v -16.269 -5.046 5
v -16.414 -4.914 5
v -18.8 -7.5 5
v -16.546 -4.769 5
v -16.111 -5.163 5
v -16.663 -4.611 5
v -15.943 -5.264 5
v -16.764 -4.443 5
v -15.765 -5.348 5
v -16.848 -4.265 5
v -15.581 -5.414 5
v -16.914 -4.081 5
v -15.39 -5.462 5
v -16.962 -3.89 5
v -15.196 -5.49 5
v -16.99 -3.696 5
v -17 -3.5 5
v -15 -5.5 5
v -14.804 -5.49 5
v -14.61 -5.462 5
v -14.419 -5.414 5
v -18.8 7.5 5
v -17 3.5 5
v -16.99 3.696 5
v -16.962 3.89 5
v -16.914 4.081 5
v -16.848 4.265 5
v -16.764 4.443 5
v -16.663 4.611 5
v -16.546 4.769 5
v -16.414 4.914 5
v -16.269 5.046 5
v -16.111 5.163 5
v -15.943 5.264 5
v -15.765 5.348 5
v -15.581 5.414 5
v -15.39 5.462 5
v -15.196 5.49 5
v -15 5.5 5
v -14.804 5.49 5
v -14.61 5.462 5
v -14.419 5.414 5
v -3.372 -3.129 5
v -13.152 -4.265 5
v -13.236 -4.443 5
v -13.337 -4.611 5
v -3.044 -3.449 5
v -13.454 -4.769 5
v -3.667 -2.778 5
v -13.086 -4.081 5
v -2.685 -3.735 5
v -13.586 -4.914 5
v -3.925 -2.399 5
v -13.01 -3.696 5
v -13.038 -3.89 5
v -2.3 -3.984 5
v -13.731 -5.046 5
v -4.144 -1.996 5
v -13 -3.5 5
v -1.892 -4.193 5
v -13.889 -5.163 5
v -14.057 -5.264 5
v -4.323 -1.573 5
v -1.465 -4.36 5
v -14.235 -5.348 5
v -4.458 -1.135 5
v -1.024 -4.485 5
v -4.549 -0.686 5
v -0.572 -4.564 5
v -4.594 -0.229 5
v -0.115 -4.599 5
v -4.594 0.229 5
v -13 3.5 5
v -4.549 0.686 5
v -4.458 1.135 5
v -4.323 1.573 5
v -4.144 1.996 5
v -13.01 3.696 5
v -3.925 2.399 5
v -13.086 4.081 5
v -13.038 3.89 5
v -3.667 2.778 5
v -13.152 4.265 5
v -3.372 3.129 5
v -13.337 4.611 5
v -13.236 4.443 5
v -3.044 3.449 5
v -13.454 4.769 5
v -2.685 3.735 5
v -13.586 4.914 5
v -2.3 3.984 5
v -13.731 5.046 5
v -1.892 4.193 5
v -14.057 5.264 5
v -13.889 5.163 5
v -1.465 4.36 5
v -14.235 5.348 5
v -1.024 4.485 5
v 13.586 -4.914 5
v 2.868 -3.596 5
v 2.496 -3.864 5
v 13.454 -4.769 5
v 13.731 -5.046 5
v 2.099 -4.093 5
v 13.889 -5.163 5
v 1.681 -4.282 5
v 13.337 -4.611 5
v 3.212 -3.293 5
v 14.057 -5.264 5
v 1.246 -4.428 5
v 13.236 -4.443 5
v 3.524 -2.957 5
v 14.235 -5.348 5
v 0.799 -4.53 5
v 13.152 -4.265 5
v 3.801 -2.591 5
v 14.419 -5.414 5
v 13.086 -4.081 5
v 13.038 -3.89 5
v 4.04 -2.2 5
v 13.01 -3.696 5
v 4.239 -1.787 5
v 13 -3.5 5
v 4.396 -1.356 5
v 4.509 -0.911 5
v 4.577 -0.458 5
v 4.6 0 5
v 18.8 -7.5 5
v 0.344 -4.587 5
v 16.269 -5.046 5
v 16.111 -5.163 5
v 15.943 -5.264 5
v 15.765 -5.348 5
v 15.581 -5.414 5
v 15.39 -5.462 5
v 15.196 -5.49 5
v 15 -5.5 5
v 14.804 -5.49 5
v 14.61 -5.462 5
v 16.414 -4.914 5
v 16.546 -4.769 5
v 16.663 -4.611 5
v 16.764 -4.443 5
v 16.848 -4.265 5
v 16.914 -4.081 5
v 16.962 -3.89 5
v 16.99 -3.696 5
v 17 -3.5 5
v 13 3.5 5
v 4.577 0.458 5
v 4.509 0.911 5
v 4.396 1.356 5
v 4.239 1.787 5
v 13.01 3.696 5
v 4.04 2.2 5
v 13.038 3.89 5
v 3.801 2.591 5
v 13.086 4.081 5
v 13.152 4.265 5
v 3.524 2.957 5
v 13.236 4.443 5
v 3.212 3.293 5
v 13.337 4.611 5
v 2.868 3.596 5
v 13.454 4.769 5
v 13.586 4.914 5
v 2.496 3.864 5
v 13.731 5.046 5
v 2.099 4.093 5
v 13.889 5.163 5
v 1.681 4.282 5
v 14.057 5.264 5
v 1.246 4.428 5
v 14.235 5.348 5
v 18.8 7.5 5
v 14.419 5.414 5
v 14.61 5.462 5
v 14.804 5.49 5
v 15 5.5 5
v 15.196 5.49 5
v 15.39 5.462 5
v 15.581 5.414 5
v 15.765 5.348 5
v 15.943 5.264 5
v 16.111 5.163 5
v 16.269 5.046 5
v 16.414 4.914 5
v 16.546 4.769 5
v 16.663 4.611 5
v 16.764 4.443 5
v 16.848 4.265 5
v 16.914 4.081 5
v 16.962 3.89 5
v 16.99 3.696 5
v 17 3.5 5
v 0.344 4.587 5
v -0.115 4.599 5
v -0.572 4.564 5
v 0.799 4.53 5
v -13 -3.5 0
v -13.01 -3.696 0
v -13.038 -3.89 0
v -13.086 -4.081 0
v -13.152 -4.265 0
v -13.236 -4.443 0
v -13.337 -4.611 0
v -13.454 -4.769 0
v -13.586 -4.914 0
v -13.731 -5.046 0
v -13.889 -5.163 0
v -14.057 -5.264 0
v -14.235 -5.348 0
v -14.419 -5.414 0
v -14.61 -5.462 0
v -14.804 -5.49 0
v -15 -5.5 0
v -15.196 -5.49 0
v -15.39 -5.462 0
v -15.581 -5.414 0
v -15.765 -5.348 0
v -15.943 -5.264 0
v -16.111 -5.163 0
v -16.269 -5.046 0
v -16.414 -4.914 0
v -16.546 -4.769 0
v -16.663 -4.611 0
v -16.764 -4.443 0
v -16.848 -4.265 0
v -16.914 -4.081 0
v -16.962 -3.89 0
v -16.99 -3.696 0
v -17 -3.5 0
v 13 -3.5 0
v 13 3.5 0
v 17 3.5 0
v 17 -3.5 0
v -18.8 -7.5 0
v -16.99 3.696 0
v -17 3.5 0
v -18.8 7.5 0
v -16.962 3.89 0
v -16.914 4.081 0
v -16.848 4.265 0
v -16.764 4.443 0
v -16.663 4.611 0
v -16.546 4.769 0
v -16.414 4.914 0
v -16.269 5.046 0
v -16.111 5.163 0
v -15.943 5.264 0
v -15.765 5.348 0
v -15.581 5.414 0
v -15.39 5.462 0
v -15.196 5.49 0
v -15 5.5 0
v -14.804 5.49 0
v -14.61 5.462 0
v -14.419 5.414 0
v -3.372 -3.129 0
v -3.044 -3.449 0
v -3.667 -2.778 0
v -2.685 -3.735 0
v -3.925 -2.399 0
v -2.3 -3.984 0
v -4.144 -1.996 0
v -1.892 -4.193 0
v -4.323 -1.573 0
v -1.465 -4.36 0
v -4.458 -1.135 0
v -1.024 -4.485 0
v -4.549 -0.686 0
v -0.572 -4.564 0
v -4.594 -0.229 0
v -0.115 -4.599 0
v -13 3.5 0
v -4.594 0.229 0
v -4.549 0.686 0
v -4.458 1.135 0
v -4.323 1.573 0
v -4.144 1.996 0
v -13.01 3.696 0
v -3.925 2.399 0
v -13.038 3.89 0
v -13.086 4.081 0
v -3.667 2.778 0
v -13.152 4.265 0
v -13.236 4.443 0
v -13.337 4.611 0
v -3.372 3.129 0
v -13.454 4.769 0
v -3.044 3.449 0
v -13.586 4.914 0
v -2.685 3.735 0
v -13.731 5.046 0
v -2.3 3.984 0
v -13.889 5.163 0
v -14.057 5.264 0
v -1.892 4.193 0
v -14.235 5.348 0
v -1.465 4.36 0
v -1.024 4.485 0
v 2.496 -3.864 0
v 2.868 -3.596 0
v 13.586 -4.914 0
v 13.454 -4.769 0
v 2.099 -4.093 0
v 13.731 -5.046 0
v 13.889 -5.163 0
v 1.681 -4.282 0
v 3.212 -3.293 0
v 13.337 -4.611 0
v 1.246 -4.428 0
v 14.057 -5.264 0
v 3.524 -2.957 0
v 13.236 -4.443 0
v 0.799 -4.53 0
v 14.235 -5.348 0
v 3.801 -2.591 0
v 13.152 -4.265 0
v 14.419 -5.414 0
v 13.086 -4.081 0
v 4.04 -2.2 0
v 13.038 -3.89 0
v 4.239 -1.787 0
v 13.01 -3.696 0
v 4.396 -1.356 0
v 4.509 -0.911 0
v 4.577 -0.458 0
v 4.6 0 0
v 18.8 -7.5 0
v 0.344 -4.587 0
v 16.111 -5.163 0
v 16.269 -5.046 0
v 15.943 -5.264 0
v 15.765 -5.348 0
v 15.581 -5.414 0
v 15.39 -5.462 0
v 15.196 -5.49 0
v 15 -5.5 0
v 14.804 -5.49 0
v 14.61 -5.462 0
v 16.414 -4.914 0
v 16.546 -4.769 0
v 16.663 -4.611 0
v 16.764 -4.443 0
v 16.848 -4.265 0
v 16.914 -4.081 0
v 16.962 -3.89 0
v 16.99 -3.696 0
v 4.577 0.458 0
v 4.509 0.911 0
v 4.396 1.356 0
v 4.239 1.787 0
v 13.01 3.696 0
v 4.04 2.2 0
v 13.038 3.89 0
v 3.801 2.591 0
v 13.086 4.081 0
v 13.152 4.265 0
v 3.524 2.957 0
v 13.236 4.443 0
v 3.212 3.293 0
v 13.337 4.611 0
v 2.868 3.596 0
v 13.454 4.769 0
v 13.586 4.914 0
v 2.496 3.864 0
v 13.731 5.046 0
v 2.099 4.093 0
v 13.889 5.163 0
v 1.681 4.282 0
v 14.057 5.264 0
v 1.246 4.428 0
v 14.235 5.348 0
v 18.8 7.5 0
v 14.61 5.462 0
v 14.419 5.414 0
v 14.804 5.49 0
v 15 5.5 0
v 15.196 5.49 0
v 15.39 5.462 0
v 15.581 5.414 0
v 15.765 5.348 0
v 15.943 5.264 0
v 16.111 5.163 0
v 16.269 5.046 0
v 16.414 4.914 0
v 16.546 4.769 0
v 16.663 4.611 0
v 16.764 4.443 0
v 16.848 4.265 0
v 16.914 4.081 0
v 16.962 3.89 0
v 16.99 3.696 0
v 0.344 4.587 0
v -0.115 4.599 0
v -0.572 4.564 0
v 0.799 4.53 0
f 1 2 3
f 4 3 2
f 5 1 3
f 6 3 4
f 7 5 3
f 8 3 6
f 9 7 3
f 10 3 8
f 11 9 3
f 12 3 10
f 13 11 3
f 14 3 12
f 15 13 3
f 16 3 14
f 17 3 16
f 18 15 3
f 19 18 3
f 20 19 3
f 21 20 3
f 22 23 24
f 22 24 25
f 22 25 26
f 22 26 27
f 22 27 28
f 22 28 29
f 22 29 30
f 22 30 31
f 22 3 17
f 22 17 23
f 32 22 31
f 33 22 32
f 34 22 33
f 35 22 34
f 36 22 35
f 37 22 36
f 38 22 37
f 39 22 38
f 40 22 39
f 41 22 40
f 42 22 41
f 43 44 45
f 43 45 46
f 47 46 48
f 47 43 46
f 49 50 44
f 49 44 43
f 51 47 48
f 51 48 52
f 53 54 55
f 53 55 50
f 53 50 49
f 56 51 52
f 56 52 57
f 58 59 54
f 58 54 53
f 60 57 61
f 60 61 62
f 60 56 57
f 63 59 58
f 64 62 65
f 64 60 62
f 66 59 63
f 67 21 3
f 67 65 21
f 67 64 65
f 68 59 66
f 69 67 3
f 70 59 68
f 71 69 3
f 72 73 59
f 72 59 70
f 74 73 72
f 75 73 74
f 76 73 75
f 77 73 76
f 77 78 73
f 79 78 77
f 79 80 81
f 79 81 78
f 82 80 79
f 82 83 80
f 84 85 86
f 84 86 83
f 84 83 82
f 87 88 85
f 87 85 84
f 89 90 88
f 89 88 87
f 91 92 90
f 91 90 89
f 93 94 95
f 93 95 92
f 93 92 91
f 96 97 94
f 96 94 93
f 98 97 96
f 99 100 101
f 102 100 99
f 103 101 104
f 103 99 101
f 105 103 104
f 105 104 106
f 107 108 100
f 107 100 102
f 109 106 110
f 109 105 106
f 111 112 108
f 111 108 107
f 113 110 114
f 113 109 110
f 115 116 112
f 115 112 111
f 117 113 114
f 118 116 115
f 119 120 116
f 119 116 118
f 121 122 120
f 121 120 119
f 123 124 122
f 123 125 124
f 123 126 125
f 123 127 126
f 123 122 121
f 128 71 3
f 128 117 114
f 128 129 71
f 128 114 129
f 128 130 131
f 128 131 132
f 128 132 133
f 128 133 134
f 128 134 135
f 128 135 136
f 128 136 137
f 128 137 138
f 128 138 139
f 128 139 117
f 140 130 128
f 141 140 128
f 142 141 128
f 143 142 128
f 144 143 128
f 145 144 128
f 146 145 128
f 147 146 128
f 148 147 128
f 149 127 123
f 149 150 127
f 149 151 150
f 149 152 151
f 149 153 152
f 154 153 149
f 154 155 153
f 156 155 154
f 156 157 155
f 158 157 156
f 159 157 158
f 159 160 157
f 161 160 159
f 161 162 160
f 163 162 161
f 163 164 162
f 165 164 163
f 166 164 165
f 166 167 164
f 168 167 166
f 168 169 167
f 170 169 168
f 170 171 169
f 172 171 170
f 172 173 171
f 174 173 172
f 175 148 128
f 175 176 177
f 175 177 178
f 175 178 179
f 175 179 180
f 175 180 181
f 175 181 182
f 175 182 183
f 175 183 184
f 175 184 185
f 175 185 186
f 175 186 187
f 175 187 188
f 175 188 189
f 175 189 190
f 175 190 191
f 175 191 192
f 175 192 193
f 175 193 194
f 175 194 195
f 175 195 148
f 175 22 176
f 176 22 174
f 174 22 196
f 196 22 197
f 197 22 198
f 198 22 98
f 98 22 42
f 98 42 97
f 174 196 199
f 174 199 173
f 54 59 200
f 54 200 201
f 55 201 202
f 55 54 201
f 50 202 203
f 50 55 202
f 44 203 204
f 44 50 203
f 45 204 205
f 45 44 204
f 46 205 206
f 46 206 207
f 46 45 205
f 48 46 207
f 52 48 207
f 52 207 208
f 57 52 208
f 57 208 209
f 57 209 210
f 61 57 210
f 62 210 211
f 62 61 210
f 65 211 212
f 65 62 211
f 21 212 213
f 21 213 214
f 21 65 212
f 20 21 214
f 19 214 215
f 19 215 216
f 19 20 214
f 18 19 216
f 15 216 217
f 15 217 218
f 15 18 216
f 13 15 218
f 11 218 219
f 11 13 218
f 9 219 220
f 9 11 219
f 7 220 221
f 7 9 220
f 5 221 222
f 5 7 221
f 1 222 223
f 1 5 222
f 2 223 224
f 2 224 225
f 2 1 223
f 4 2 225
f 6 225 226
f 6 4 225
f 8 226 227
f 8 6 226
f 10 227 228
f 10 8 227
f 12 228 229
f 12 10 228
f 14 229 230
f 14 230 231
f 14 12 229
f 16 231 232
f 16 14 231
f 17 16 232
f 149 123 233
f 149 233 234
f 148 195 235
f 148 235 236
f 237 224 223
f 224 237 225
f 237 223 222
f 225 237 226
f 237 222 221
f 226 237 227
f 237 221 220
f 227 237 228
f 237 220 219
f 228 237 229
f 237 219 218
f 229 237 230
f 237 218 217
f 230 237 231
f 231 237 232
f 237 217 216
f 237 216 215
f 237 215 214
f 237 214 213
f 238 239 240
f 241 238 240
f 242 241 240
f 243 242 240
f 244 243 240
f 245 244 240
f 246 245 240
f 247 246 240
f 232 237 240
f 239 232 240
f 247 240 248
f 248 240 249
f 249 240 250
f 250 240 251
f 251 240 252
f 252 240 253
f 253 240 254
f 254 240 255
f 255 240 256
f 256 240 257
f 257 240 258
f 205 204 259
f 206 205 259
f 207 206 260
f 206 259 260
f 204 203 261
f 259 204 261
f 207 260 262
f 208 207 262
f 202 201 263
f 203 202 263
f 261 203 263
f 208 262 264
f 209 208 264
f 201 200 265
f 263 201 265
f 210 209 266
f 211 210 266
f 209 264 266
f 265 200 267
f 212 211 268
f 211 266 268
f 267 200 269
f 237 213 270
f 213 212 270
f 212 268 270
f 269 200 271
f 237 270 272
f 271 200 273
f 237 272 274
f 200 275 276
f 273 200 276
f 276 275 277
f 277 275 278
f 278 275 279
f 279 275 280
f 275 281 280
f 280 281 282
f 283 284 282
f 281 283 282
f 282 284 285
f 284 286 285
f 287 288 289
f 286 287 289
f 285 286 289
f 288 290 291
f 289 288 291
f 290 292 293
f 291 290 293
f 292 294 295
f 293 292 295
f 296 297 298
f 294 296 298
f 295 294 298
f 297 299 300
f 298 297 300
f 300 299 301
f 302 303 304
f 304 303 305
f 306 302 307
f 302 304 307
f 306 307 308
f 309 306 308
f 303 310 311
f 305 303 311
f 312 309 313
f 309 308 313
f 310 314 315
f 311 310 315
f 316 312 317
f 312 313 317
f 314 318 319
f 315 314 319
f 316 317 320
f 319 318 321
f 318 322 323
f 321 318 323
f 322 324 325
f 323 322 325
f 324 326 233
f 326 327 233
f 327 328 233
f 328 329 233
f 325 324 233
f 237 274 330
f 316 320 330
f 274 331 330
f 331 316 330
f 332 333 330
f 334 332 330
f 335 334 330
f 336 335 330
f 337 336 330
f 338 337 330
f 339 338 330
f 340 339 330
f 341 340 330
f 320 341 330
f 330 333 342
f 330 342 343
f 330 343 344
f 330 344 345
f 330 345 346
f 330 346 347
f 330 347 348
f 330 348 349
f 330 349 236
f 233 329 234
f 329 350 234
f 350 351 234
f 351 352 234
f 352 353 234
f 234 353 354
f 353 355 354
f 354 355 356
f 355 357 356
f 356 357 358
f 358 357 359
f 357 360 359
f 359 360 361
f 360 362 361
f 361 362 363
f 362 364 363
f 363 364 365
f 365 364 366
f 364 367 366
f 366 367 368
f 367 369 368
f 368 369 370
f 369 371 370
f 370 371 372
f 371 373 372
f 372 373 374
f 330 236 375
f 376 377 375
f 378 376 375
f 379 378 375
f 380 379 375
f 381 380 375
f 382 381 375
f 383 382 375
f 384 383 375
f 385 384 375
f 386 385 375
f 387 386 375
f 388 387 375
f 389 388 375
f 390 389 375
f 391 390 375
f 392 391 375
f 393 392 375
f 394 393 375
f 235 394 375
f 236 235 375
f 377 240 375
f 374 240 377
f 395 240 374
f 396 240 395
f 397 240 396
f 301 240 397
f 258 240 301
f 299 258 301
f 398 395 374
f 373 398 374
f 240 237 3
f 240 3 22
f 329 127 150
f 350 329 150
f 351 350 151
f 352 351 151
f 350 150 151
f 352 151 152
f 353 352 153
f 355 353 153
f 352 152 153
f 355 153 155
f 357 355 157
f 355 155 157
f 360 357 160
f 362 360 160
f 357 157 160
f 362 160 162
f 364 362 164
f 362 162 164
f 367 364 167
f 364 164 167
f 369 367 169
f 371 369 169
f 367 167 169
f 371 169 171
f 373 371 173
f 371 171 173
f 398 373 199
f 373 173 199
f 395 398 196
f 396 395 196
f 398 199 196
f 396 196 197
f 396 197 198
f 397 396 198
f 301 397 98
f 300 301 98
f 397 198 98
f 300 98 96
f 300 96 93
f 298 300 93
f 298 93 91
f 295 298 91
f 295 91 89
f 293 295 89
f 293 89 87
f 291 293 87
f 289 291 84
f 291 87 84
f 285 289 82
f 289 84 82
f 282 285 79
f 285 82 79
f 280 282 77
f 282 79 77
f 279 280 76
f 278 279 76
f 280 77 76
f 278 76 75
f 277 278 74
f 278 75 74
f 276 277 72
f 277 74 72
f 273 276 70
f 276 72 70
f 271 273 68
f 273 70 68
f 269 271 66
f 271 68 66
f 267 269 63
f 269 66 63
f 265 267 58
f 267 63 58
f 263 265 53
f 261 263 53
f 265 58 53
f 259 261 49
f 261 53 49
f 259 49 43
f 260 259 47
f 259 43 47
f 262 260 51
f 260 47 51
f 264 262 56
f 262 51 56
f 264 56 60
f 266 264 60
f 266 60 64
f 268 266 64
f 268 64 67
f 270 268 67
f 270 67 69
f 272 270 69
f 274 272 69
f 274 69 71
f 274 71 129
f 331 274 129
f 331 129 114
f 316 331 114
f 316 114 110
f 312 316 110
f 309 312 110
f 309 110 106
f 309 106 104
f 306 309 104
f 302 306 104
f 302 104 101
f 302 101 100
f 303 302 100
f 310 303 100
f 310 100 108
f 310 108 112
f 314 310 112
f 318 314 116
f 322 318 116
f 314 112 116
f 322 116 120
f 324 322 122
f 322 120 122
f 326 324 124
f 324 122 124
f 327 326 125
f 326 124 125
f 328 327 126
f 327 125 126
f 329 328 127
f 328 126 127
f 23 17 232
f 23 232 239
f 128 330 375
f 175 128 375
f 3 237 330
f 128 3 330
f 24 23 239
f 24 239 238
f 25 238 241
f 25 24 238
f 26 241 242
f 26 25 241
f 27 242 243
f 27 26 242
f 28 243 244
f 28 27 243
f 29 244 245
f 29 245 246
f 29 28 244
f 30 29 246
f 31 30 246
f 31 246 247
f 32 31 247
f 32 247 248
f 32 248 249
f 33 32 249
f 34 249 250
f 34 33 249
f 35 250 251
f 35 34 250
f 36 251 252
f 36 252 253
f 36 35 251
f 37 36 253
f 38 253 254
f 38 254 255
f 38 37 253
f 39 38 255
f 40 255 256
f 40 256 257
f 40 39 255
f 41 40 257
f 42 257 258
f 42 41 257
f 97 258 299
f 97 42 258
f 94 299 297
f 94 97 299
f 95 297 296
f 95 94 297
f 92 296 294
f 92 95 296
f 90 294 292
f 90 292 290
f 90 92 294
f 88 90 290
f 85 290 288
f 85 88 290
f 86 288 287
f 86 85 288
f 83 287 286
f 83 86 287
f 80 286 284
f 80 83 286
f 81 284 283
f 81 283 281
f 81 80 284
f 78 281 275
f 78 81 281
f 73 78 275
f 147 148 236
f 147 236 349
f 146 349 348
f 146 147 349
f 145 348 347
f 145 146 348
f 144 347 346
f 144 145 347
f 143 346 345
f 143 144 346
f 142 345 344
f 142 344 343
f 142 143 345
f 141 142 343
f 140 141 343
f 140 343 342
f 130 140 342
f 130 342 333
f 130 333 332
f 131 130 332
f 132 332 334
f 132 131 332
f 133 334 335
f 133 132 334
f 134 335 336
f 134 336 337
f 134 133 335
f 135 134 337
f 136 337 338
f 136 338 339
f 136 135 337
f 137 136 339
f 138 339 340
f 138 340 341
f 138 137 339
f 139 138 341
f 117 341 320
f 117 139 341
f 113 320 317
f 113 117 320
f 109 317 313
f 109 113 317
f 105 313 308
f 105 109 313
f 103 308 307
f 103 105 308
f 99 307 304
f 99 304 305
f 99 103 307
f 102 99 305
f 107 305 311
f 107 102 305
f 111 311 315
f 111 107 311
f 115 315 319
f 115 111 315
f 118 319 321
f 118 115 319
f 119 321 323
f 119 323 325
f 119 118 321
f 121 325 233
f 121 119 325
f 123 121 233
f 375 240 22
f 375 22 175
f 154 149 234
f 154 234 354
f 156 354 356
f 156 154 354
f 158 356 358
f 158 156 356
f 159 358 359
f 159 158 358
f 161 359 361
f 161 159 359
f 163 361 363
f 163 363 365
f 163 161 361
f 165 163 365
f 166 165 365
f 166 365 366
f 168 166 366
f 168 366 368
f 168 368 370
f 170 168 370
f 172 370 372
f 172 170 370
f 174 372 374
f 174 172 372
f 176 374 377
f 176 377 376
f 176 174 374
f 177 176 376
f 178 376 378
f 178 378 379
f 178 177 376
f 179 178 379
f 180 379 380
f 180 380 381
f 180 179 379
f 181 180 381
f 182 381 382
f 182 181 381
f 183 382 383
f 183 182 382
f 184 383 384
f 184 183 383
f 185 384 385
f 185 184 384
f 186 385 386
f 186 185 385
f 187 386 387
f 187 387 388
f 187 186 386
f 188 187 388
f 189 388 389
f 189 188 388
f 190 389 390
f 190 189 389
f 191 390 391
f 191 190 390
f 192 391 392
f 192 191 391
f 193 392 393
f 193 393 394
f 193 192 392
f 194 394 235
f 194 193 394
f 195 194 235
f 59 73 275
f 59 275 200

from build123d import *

# Parameters (mm, degrees)
SKETCH1_W           = 37.6
SKETCH1_H           = 15
BOSS_EXTRUDE1_DEPTH = 5
CUT_EXTRUDE1_DEPTH  = 5
SKETCH3_R           = 4.6
CUT_EXTRUDE2_DEPTH  = 5


with BuildPart() as part:
    # Sketch1 → Boss-Extrude1 (new body)
    with BuildSketch(Plane.XY):
        Rectangle(SKETCH1_W, SKETCH1_H)
    extrude(amount=BOSS_EXTRUDE1_DEPTH)

    # Sketch2 → Cut-Extrude1 (cut)
    with BuildSketch(Plane.XY.offset(5)):
        with BuildLine():
            Line((-13, 3.5), (-13, -3.5))
            ThreePointArc((-13, -3.5), (-15, -5.5), (-17, -3.5))
            Line((-17, -3.5), (-17, 3.5))
            ThreePointArc((-17, 3.5), (-15, 5.5), (-13, 3.5))
        make_face()
        with BuildLine():
            Line((17, 3.5), (17, -3.5))
            ThreePointArc((17, -3.5), (15, -5.5), (13, -3.5))
            Line((13, -3.5), (13, 3.5))
            ThreePointArc((13, 3.5), (15, 5.5), (17, 3.5))
        make_face()
    extrude(amount=-CUT_EXTRUDE1_DEPTH, mode=Mode.SUBTRACT)

    # Sketch3 → Cut-Extrude2 (cut)
    with BuildSketch(Plane.XY.offset(5)):
        Circle(SKETCH3_R)
    extrude(amount=-CUT_EXTRUDE2_DEPTH, mode=Mode.SUBTRACT)


solid = part.part
